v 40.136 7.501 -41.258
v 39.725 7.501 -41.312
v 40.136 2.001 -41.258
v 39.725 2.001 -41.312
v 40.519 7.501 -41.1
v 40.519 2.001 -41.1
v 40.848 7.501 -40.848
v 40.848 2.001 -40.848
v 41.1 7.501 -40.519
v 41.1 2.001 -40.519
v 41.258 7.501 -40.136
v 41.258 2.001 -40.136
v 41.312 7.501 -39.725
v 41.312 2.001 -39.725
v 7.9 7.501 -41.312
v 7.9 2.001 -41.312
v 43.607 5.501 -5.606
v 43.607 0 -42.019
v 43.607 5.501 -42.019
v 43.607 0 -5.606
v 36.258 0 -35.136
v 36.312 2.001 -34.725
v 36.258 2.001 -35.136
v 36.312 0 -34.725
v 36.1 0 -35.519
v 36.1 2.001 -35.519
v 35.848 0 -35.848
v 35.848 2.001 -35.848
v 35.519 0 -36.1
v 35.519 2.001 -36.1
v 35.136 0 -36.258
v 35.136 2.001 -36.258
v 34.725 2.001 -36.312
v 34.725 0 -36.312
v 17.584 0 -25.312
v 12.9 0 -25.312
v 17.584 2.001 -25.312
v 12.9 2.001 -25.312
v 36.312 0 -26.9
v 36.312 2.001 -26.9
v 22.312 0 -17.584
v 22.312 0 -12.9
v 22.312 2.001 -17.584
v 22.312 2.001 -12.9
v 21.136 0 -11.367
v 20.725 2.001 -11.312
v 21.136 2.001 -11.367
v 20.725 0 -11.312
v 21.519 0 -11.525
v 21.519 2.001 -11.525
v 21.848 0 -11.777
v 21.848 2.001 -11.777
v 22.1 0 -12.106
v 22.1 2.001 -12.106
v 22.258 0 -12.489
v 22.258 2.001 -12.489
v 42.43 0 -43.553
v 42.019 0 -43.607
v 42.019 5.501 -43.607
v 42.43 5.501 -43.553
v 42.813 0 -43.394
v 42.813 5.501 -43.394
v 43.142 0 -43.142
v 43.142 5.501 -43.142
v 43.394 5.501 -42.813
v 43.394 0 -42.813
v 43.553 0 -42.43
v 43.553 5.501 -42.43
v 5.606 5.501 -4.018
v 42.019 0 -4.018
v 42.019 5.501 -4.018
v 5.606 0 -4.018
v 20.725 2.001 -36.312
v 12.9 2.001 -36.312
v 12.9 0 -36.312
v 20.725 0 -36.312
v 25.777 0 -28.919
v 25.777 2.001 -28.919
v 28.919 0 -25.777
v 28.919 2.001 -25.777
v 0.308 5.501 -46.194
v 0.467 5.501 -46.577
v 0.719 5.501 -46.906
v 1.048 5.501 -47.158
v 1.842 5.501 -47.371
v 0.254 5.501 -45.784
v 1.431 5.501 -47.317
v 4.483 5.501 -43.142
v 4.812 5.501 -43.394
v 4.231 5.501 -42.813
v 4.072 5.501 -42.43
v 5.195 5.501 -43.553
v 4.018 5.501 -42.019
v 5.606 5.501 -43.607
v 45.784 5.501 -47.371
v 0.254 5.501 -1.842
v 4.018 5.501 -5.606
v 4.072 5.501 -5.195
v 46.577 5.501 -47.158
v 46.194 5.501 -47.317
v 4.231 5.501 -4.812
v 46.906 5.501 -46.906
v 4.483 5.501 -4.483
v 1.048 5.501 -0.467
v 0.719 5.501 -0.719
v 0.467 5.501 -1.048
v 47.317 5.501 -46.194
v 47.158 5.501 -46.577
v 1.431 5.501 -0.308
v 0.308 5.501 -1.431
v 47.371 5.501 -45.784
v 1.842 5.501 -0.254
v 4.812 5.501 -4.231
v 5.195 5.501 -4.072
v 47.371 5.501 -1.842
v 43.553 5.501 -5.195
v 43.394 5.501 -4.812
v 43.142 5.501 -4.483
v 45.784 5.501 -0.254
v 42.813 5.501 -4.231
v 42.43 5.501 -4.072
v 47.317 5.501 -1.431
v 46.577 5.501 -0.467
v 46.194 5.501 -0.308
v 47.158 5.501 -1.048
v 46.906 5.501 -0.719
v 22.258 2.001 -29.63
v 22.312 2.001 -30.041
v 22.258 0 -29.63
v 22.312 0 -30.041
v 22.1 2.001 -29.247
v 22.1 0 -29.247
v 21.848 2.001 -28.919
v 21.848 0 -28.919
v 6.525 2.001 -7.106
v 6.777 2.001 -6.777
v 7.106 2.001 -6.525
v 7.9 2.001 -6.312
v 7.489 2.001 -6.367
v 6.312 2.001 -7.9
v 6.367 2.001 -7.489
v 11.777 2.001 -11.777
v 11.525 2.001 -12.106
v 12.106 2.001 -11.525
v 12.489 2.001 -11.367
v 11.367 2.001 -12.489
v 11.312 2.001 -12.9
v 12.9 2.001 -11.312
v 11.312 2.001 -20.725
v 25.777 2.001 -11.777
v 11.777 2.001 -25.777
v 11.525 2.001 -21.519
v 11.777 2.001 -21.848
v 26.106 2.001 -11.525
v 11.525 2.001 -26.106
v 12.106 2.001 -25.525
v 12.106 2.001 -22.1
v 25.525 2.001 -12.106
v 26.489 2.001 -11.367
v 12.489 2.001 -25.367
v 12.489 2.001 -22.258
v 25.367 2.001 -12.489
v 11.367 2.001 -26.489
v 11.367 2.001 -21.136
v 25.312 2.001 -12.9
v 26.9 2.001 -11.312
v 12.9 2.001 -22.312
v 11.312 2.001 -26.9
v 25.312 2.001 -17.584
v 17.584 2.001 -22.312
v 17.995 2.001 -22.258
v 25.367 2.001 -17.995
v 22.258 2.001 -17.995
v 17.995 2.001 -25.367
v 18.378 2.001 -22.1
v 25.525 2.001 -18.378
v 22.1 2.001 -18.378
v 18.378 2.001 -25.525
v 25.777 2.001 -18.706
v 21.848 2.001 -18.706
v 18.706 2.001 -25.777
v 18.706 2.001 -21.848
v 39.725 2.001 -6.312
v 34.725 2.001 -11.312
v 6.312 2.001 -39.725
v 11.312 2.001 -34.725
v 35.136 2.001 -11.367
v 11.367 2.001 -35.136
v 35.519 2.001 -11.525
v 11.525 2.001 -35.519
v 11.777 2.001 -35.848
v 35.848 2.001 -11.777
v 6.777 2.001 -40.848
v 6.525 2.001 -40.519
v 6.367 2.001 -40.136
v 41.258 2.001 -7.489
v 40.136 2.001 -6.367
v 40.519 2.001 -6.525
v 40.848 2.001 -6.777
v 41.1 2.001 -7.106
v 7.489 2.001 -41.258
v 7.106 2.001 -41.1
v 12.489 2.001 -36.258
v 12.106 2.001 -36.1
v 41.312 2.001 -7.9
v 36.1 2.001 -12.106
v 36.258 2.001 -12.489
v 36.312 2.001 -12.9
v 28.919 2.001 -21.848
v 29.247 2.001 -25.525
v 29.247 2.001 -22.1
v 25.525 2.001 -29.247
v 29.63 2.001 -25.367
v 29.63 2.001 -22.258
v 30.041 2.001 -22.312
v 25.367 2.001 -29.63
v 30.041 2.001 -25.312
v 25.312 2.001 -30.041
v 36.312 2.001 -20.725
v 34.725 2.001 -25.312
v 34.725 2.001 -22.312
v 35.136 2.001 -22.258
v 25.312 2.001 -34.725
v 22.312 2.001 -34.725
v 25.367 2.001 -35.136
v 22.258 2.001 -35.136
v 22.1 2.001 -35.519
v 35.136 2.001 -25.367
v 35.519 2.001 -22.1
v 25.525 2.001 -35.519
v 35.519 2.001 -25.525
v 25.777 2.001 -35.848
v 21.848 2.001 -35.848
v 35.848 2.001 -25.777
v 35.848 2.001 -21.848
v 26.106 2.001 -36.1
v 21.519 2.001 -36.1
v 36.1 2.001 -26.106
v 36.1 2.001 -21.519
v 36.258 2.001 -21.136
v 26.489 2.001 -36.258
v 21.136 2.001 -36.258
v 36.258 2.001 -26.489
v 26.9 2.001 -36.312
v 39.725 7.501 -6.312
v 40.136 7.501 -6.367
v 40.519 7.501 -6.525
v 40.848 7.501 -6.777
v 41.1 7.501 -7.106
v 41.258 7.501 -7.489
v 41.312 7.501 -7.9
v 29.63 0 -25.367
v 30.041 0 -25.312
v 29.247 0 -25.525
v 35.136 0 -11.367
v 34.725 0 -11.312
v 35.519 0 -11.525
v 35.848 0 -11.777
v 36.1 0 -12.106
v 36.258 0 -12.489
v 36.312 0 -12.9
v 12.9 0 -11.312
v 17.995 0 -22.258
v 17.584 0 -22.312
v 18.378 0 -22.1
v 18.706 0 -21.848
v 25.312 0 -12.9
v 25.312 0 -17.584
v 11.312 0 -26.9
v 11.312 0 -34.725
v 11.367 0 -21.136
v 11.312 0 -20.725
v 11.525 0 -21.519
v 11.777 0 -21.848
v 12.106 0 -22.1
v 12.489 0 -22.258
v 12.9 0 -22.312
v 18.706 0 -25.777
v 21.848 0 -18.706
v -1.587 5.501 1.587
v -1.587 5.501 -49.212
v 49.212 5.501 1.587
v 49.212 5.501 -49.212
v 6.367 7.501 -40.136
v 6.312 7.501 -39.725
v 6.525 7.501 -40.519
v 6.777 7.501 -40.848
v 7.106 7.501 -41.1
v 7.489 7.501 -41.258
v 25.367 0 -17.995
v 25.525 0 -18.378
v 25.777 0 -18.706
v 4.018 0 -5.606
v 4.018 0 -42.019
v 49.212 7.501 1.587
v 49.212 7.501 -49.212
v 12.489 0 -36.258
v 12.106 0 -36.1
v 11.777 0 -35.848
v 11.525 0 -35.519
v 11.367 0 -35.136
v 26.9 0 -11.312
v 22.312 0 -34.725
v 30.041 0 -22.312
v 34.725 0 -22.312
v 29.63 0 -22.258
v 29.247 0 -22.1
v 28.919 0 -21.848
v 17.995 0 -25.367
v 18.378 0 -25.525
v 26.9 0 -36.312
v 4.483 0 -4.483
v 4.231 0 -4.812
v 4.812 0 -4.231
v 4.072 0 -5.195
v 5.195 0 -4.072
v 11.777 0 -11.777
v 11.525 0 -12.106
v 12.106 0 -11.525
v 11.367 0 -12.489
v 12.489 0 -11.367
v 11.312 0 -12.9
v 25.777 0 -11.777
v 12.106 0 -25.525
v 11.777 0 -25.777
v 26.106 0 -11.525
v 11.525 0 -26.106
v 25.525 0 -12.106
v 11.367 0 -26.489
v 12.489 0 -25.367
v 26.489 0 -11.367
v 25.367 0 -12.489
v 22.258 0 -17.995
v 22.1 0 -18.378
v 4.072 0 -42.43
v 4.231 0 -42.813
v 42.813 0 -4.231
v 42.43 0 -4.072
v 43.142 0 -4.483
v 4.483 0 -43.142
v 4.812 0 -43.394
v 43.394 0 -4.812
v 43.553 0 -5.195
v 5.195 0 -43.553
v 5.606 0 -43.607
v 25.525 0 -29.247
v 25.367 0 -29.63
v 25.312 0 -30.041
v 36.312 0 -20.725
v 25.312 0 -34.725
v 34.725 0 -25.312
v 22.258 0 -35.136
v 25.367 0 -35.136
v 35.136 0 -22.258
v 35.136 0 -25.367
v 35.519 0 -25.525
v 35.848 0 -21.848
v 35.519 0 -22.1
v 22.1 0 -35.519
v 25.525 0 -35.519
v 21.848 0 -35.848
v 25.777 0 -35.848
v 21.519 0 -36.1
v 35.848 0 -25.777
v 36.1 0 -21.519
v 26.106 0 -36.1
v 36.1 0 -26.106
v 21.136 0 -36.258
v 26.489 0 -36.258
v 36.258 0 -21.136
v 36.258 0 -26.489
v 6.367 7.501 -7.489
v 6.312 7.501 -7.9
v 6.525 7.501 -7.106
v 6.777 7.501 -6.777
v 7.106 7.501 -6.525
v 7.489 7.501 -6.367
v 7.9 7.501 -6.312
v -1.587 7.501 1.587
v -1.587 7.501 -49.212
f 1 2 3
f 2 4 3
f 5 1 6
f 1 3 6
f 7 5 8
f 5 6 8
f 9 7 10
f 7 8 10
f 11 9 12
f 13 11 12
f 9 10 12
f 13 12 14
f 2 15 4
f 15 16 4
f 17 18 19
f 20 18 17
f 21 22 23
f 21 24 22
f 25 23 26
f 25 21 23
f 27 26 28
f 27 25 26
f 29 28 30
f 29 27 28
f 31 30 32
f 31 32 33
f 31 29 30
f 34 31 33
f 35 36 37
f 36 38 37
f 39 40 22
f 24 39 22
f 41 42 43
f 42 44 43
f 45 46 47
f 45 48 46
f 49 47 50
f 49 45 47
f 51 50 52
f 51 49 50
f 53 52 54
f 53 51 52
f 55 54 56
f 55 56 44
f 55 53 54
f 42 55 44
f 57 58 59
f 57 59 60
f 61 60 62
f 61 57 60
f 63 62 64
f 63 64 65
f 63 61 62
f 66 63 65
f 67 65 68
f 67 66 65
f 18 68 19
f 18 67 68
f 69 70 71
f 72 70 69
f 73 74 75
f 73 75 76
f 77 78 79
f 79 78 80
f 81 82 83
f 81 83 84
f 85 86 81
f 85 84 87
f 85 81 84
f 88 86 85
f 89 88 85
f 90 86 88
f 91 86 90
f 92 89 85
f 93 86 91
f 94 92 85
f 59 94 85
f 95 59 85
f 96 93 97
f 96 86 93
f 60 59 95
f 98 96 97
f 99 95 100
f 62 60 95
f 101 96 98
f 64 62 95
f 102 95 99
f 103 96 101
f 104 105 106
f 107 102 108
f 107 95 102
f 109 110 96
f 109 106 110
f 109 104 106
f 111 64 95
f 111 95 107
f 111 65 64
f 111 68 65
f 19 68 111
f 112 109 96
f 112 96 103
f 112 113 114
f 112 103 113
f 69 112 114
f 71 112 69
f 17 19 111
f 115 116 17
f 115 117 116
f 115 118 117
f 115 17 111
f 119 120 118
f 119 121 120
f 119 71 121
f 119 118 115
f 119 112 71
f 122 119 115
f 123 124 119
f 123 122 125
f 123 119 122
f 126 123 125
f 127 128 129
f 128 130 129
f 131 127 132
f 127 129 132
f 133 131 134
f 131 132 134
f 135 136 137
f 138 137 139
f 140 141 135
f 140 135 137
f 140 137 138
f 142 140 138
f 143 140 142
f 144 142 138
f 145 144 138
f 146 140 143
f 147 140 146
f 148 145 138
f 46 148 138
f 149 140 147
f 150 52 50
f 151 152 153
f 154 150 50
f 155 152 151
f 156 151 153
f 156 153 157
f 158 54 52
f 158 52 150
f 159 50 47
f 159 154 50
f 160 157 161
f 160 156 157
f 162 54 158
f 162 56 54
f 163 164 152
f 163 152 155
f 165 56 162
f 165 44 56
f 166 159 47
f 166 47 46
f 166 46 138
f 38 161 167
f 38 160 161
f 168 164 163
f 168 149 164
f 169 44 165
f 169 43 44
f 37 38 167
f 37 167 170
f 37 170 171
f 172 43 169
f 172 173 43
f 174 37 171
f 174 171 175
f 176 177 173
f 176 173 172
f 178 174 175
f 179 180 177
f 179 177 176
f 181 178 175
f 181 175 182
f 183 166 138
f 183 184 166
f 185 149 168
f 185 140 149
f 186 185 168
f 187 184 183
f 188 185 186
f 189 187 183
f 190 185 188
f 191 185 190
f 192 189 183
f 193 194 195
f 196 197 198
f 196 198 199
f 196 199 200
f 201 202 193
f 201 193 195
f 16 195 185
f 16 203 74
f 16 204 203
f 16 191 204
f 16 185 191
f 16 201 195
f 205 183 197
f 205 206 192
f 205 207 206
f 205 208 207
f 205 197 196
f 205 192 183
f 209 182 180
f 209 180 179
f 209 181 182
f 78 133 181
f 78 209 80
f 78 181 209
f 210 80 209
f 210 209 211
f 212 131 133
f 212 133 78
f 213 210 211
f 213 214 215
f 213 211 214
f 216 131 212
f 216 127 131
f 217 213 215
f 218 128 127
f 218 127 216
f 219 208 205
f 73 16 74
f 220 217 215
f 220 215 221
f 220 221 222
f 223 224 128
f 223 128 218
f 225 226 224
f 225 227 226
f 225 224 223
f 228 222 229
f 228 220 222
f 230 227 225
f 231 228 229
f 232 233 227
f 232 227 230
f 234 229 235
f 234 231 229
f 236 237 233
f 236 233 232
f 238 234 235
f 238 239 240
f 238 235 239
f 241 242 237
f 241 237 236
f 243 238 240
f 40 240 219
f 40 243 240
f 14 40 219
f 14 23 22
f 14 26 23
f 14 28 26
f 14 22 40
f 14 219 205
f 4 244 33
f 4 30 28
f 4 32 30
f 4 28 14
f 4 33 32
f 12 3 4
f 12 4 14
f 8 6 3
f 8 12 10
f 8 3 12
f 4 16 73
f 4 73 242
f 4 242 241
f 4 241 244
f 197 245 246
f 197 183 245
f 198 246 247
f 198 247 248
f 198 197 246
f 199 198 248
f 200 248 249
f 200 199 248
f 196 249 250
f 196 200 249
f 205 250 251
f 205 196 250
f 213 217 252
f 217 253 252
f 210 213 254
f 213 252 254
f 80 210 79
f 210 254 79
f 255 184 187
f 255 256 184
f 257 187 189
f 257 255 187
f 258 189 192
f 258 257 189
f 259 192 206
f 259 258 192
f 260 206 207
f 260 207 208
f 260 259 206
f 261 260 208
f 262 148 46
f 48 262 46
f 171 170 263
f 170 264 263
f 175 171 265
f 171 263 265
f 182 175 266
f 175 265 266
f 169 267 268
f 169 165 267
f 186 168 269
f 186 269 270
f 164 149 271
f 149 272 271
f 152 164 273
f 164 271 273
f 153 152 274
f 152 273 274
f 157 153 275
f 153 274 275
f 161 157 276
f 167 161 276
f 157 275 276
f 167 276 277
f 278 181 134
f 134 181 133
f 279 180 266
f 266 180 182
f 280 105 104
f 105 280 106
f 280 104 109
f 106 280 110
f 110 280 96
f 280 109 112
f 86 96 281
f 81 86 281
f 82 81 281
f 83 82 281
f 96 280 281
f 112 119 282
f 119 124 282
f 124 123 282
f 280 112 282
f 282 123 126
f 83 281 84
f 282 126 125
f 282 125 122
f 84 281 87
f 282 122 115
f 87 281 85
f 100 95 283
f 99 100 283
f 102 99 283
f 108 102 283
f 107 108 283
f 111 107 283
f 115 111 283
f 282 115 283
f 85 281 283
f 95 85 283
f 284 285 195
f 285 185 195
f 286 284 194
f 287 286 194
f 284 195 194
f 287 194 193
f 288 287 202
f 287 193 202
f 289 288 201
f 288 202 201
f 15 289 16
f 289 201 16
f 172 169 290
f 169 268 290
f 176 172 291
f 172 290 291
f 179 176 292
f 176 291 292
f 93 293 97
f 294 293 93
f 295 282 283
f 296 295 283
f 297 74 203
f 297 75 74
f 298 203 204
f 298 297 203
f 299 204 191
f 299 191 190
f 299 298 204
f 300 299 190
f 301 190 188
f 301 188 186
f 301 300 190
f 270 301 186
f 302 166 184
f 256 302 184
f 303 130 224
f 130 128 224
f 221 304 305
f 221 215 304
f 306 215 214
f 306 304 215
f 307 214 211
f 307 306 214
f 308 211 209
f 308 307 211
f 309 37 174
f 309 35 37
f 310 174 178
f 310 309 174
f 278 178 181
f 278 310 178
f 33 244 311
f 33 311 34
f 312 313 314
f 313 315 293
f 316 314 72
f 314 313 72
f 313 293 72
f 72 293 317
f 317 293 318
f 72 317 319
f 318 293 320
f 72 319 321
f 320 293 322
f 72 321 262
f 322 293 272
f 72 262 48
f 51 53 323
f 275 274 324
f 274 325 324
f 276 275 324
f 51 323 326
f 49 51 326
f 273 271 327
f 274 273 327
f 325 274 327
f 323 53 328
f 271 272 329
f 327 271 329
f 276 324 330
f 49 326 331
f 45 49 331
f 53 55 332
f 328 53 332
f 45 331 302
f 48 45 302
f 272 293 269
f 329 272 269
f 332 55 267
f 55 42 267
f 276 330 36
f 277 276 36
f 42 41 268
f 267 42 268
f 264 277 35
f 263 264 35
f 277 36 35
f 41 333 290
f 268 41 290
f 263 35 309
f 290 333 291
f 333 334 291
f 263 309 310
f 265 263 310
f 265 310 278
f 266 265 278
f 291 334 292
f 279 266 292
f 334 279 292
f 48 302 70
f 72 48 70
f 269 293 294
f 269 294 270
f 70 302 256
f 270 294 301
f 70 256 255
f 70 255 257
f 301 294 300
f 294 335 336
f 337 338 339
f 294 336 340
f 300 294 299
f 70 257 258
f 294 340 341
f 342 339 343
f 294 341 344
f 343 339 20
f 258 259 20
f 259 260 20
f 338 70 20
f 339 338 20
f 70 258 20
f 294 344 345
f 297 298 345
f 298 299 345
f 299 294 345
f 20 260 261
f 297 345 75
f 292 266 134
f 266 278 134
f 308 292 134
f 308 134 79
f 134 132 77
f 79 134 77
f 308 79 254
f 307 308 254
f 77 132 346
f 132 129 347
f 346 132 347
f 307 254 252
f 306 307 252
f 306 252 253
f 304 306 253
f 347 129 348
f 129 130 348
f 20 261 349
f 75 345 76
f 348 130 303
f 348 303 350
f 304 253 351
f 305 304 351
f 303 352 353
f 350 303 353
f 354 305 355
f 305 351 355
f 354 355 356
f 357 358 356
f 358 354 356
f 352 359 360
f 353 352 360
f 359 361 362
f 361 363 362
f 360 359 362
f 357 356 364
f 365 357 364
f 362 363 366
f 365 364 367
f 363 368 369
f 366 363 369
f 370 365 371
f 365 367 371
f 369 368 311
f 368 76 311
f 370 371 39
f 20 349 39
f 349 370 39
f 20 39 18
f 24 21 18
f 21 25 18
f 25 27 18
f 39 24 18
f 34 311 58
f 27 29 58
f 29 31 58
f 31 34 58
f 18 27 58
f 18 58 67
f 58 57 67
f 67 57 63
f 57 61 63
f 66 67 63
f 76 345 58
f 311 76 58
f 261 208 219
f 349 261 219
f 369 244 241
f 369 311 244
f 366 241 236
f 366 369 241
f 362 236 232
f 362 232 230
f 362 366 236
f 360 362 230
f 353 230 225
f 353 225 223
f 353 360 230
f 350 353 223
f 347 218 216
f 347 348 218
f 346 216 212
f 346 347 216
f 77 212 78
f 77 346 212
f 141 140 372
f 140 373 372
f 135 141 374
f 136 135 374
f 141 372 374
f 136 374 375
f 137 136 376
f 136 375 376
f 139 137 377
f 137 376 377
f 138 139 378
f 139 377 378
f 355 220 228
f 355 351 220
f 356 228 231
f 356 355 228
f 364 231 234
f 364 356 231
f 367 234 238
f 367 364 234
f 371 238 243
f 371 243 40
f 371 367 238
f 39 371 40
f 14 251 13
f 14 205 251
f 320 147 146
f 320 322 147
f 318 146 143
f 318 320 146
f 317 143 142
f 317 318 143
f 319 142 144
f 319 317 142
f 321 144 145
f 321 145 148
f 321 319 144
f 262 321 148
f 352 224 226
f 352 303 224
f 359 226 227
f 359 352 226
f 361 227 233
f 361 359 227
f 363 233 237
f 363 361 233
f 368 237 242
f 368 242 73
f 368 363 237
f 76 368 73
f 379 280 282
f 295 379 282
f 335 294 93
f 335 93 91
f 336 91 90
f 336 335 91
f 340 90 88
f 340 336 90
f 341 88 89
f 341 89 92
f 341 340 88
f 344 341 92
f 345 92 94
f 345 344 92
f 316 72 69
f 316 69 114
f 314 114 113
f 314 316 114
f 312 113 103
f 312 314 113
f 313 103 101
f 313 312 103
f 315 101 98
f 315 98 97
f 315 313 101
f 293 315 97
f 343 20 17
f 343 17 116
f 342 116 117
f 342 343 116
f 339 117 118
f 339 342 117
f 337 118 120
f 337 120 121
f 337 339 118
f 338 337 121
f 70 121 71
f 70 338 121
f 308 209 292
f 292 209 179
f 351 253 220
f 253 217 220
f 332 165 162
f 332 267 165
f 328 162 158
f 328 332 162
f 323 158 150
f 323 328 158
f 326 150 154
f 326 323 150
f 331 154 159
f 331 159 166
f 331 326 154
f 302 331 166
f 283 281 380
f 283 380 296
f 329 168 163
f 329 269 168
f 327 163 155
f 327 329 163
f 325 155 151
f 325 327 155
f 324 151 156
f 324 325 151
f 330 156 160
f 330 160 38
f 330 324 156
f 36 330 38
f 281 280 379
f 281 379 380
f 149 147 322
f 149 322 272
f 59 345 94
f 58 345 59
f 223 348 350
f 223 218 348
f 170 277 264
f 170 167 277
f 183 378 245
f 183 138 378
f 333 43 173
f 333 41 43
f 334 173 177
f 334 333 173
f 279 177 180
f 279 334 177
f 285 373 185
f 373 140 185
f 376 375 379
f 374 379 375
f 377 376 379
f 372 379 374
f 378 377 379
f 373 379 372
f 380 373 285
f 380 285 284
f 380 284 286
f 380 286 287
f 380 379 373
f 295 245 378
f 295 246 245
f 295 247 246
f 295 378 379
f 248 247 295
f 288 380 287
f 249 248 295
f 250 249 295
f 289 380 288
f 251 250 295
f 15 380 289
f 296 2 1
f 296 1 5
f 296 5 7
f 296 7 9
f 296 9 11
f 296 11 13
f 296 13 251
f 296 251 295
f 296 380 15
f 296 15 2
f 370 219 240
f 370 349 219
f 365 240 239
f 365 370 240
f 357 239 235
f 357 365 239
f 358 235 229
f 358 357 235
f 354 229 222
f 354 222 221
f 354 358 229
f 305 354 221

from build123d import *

# Parameters (mm, degrees)
SKETCH3_W           = 47.117
SKETCH3_H           = 47.117
BOSS_EXTRUDE1_DEPTH = 5.500799822
CUT_EXTRUDE2_REACH  = 7.501
SKETCH6_W           = 11
SKETCH6_H           = 11
SKETCH7_W           = 50.8
SKETCH7_H           = 50.8
SKETCH7_W_2         = 35
SKETCH7_H_2         = 35
BOSS_EXTRUDE2_DEPTH = 1.999999976
SKETCH12_W          = 35
SKETCH12_H          = 35
CUT_EXTRUDE3_DEPTH  = 3.499999912
BOSS_EXTRUDE4_DEPTH = 2.0008
FILLET3_R           = 1.5875
CUT_EXTRUDE5_DEPTH  = 5.5008


with BuildPart() as part:
    # Sketch3 → Boss-Extrude1 (new body)
    with BuildSketch(Plane(origin=(0, 0, 0), x_dir=(1, 0, 0), z_dir=(0, 1, 0))):
        with Locations((23.8125, 23.8125)):
            Rectangle(SKETCH3_W, SKETCH3_H)
    extrude(amount=BOSS_EXTRUDE1_DEPTH)

    # Sketch6 → Cut-Extrude2 (cut, up to next)
    with BuildSketch(Plane(origin=(0, 5.500799822, 0), x_dir=(1, 0, 0), z_dir=(0, 1, 0)), mode=Mode.PRIVATE) as cut_extrude2_sk1:
        with Locations((16.8125, 30.8125)):
            Rectangle(SKETCH6_W, SKETCH6_H)
    cut_extrude2_tool1 = extrude(cut_extrude2_sk1.sketch, amount=-CUT_EXTRUDE2_REACH, mode=Mode.PRIVATE) & part.part
    add(cut_extrude2_tool1.solids().sort_by_distance((16.8125, 5.5008, -30.8125))[0], mode=Mode.SUBTRACT)
    # Sketch6 → Cut-Extrude2 (cut, up to next)
    with BuildSketch(Plane(origin=(0, 5.500799822, 0), x_dir=(1, 0, 0), z_dir=(0, 1, 0)), mode=Mode.PRIVATE) as cut_extrude2_sk2:
        with Locations((30.8125, 30.8125)):
            Rectangle(SKETCH6_W, SKETCH6_H)
    cut_extrude2_tool2 = extrude(cut_extrude2_sk2.sketch, amount=-CUT_EXTRUDE2_REACH, mode=Mode.PRIVATE) & part.part
    add(cut_extrude2_tool2.solids().sort_by_distance((30.8125, 5.5008, -30.8125))[0], mode=Mode.SUBTRACT)
    # Sketch6 → Cut-Extrude2 (cut, up to next)
    with BuildSketch(Plane(origin=(0, 5.500799822, 0), x_dir=(1, 0, 0), z_dir=(0, 1, 0)), mode=Mode.PRIVATE) as cut_extrude2_sk3:
        with Locations((30.8125, 16.8125)):
            Rectangle(SKETCH6_W, SKETCH6_H)
    cut_extrude2_tool3 = extrude(cut_extrude2_sk3.sketch, amount=-CUT_EXTRUDE2_REACH, mode=Mode.PRIVATE) & part.part
    add(cut_extrude2_tool3.solids().sort_by_distance((30.8125, 5.5008, -16.8125))[0], mode=Mode.SUBTRACT)
    # Sketch6 → Cut-Extrude2 (cut, up to next)
    with BuildSketch(Plane(origin=(0, 5.500799822, 0), x_dir=(1, 0, 0), z_dir=(0, 1, 0)), mode=Mode.PRIVATE) as cut_extrude2_sk4:
        with Locations((16.8125, 16.8125)):
            Rectangle(SKETCH6_W, SKETCH6_H)
    cut_extrude2_tool4 = extrude(cut_extrude2_sk4.sketch, amount=-CUT_EXTRUDE2_REACH, mode=Mode.PRIVATE) & part.part
    add(cut_extrude2_tool4.solids().sort_by_distance((16.8125, 5.5008, -16.8125))[0], mode=Mode.SUBTRACT)

    # Sketch7 → Boss-Extrude2 (add)
    with BuildSketch(Plane(origin=(0, 5.500799822, 0), x_dir=(1, 0, 0), z_dir=(0, 1, 0))):
        with Locations((23.8125, 23.8125)):
            Rectangle(SKETCH7_W, SKETCH7_H)
        with Locations((23.8125, 23.8125)):
            Rectangle(SKETCH7_W_2, SKETCH7_H_2, mode=Mode.SUBTRACT)
    extrude(amount=BOSS_EXTRUDE2_DEPTH)

    # Sketch12 → Cut-Extrude3 (cut)
    with BuildSketch(Plane(origin=(0, 5.500799822, 0), x_dir=(1, 0, 0), z_dir=(0, 1, 0))):
        with Locations((23.8125, 23.8125)):
            Rectangle(SKETCH12_W, SKETCH12_H)
    extrude(amount=-CUT_EXTRUDE3_DEPTH, mode=Mode.SUBTRACT)

    # Sketch11 → Boss-Extrude4 (add)
    with BuildSketch(Plane(origin=(0, 2.00079991, 0), x_dir=(1, 0, 0), z_dir=(0, 1, 0))):
        Polygon((22.3125, 29.383567812), (25.3125, 29.383567812), (29.383567812, 25.3125), (29.383567812, 22.3125), (25.3125, 18.241432188), (22.3125, 18.241432188), (18.241432188, 22.3125), (18.241432188, 25.3125), align=None)
    extrude(amount=-BOSS_EXTRUDE4_DEPTH)

    # Fillet3
    fillet3_edges = [part.edges().sort_by_distance(p)[0] for p in [
        (29.383567812, 1.00039991, -22.3125),
        (25.3125, 1.00039991, -18.241432188),
        (22.3125, 1.00039991, -18.241432188),
        (18.241432188, 1.00039991, -22.3125),
        (18.241432188, 1.00039991, -25.3125),
        (22.3125, 1.00039991, -29.383567812),
        (25.3125, 1.00039991, -29.383567812),
        (29.383567812, 1.00039991, -25.3125),
        (36.3125, 1.000399955, -22.3125),
        (36.3125, 1.000399955, -11.3125),
        (25.3125, 1.000399955, -11.3125),
        (11.3125, 1.000399955, -36.3125),
        (22.3125, 1.000399955, -36.3125),
        (11.3125, 1.000399955, -25.3125),
        (22.3125, 1.000399955, -11.3125),
        (11.3125, 1.000399955, -11.3125),
        (11.3125, 1.000399955, -22.3125),
        (36.3125, 1.000399955, -25.3125),
        (25.3125, 1.000399955, -36.3125),
        (36.3125, 1.000399955, -36.3125),
        (6.3125, 4.750799854, -6.3125),
        (41.3125, 4.750799854, -6.3125),
        (41.3125, 4.750799854, -41.3125),
        (6.3125, 4.750799854, -41.3125),
        (0.254, 2.750399911, -47.371),
        (47.371, 2.750399911, -47.371),
        (47.371, 2.750399911, -0.254),
        (0.254, 2.750399911, -0.254),
    ]]
    fillet(fillet3_edges, radius=FILLET3_R)

    # Sketch13 → Cut-Extrude5 (cut)
    with BuildSketch(Plane.XZ):
        with BuildLine():
            Line((0.254, -1.8415), (0.254, -45.7835))
            ThreePointArc((0.254, -45.7835), (0.718967985, -46.906032015), (1.8415, -47.371))
            Line((1.8415, -47.371), (45.7835, -47.371))
            ThreePointArc((45.7835, -47.371), (46.906032015, -46.906032015), (47.371, -45.7835))
            Line((47.371, -45.7835), (47.371, -1.8415))
            ThreePointArc((47.371, -1.8415), (46.906032015, -0.718967985), (45.7835, -0.254))
            Line((45.7835, -0.254), (1.8415, -0.254))
            ThreePointArc((1.8415, -0.254), (0.718967985, -0.718967985), (0.254, -1.8415))
        make_face()
        with BuildLine():
            Line((4.018000092, -5.605500092), (4.018000092, -42.019499908))
            ThreePointArc((4.018000092, -42.019499908), (4.482968077, -43.142031923), (5.605500092, -43.606999908))
            Line((5.605500092, -43.606999908), (42.019499908, -43.606999908))
            ThreePointArc((42.019499908, -43.606999908), (43.142031923, -43.142031923), (43.606999908, -42.019499908))
            Line((43.606999908, -42.019499908), (43.606999908, -5.605500092))
            ThreePointArc((43.606999908, -5.605500092), (43.142031923, -4.482968077), (42.019499908, -4.018000092))
            Line((42.019499908, -4.018000092), (5.605500092, -4.018000092))
            ThreePointArc((5.605500092, -4.018000092), (4.482968077, -4.482968077), (4.018000092, -5.605500092))
        make_face(mode=Mode.SUBTRACT)
    extrude(amount=-CUT_EXTRUDE5_DEPTH, mode=Mode.SUBTRACT)


solid = part.part
